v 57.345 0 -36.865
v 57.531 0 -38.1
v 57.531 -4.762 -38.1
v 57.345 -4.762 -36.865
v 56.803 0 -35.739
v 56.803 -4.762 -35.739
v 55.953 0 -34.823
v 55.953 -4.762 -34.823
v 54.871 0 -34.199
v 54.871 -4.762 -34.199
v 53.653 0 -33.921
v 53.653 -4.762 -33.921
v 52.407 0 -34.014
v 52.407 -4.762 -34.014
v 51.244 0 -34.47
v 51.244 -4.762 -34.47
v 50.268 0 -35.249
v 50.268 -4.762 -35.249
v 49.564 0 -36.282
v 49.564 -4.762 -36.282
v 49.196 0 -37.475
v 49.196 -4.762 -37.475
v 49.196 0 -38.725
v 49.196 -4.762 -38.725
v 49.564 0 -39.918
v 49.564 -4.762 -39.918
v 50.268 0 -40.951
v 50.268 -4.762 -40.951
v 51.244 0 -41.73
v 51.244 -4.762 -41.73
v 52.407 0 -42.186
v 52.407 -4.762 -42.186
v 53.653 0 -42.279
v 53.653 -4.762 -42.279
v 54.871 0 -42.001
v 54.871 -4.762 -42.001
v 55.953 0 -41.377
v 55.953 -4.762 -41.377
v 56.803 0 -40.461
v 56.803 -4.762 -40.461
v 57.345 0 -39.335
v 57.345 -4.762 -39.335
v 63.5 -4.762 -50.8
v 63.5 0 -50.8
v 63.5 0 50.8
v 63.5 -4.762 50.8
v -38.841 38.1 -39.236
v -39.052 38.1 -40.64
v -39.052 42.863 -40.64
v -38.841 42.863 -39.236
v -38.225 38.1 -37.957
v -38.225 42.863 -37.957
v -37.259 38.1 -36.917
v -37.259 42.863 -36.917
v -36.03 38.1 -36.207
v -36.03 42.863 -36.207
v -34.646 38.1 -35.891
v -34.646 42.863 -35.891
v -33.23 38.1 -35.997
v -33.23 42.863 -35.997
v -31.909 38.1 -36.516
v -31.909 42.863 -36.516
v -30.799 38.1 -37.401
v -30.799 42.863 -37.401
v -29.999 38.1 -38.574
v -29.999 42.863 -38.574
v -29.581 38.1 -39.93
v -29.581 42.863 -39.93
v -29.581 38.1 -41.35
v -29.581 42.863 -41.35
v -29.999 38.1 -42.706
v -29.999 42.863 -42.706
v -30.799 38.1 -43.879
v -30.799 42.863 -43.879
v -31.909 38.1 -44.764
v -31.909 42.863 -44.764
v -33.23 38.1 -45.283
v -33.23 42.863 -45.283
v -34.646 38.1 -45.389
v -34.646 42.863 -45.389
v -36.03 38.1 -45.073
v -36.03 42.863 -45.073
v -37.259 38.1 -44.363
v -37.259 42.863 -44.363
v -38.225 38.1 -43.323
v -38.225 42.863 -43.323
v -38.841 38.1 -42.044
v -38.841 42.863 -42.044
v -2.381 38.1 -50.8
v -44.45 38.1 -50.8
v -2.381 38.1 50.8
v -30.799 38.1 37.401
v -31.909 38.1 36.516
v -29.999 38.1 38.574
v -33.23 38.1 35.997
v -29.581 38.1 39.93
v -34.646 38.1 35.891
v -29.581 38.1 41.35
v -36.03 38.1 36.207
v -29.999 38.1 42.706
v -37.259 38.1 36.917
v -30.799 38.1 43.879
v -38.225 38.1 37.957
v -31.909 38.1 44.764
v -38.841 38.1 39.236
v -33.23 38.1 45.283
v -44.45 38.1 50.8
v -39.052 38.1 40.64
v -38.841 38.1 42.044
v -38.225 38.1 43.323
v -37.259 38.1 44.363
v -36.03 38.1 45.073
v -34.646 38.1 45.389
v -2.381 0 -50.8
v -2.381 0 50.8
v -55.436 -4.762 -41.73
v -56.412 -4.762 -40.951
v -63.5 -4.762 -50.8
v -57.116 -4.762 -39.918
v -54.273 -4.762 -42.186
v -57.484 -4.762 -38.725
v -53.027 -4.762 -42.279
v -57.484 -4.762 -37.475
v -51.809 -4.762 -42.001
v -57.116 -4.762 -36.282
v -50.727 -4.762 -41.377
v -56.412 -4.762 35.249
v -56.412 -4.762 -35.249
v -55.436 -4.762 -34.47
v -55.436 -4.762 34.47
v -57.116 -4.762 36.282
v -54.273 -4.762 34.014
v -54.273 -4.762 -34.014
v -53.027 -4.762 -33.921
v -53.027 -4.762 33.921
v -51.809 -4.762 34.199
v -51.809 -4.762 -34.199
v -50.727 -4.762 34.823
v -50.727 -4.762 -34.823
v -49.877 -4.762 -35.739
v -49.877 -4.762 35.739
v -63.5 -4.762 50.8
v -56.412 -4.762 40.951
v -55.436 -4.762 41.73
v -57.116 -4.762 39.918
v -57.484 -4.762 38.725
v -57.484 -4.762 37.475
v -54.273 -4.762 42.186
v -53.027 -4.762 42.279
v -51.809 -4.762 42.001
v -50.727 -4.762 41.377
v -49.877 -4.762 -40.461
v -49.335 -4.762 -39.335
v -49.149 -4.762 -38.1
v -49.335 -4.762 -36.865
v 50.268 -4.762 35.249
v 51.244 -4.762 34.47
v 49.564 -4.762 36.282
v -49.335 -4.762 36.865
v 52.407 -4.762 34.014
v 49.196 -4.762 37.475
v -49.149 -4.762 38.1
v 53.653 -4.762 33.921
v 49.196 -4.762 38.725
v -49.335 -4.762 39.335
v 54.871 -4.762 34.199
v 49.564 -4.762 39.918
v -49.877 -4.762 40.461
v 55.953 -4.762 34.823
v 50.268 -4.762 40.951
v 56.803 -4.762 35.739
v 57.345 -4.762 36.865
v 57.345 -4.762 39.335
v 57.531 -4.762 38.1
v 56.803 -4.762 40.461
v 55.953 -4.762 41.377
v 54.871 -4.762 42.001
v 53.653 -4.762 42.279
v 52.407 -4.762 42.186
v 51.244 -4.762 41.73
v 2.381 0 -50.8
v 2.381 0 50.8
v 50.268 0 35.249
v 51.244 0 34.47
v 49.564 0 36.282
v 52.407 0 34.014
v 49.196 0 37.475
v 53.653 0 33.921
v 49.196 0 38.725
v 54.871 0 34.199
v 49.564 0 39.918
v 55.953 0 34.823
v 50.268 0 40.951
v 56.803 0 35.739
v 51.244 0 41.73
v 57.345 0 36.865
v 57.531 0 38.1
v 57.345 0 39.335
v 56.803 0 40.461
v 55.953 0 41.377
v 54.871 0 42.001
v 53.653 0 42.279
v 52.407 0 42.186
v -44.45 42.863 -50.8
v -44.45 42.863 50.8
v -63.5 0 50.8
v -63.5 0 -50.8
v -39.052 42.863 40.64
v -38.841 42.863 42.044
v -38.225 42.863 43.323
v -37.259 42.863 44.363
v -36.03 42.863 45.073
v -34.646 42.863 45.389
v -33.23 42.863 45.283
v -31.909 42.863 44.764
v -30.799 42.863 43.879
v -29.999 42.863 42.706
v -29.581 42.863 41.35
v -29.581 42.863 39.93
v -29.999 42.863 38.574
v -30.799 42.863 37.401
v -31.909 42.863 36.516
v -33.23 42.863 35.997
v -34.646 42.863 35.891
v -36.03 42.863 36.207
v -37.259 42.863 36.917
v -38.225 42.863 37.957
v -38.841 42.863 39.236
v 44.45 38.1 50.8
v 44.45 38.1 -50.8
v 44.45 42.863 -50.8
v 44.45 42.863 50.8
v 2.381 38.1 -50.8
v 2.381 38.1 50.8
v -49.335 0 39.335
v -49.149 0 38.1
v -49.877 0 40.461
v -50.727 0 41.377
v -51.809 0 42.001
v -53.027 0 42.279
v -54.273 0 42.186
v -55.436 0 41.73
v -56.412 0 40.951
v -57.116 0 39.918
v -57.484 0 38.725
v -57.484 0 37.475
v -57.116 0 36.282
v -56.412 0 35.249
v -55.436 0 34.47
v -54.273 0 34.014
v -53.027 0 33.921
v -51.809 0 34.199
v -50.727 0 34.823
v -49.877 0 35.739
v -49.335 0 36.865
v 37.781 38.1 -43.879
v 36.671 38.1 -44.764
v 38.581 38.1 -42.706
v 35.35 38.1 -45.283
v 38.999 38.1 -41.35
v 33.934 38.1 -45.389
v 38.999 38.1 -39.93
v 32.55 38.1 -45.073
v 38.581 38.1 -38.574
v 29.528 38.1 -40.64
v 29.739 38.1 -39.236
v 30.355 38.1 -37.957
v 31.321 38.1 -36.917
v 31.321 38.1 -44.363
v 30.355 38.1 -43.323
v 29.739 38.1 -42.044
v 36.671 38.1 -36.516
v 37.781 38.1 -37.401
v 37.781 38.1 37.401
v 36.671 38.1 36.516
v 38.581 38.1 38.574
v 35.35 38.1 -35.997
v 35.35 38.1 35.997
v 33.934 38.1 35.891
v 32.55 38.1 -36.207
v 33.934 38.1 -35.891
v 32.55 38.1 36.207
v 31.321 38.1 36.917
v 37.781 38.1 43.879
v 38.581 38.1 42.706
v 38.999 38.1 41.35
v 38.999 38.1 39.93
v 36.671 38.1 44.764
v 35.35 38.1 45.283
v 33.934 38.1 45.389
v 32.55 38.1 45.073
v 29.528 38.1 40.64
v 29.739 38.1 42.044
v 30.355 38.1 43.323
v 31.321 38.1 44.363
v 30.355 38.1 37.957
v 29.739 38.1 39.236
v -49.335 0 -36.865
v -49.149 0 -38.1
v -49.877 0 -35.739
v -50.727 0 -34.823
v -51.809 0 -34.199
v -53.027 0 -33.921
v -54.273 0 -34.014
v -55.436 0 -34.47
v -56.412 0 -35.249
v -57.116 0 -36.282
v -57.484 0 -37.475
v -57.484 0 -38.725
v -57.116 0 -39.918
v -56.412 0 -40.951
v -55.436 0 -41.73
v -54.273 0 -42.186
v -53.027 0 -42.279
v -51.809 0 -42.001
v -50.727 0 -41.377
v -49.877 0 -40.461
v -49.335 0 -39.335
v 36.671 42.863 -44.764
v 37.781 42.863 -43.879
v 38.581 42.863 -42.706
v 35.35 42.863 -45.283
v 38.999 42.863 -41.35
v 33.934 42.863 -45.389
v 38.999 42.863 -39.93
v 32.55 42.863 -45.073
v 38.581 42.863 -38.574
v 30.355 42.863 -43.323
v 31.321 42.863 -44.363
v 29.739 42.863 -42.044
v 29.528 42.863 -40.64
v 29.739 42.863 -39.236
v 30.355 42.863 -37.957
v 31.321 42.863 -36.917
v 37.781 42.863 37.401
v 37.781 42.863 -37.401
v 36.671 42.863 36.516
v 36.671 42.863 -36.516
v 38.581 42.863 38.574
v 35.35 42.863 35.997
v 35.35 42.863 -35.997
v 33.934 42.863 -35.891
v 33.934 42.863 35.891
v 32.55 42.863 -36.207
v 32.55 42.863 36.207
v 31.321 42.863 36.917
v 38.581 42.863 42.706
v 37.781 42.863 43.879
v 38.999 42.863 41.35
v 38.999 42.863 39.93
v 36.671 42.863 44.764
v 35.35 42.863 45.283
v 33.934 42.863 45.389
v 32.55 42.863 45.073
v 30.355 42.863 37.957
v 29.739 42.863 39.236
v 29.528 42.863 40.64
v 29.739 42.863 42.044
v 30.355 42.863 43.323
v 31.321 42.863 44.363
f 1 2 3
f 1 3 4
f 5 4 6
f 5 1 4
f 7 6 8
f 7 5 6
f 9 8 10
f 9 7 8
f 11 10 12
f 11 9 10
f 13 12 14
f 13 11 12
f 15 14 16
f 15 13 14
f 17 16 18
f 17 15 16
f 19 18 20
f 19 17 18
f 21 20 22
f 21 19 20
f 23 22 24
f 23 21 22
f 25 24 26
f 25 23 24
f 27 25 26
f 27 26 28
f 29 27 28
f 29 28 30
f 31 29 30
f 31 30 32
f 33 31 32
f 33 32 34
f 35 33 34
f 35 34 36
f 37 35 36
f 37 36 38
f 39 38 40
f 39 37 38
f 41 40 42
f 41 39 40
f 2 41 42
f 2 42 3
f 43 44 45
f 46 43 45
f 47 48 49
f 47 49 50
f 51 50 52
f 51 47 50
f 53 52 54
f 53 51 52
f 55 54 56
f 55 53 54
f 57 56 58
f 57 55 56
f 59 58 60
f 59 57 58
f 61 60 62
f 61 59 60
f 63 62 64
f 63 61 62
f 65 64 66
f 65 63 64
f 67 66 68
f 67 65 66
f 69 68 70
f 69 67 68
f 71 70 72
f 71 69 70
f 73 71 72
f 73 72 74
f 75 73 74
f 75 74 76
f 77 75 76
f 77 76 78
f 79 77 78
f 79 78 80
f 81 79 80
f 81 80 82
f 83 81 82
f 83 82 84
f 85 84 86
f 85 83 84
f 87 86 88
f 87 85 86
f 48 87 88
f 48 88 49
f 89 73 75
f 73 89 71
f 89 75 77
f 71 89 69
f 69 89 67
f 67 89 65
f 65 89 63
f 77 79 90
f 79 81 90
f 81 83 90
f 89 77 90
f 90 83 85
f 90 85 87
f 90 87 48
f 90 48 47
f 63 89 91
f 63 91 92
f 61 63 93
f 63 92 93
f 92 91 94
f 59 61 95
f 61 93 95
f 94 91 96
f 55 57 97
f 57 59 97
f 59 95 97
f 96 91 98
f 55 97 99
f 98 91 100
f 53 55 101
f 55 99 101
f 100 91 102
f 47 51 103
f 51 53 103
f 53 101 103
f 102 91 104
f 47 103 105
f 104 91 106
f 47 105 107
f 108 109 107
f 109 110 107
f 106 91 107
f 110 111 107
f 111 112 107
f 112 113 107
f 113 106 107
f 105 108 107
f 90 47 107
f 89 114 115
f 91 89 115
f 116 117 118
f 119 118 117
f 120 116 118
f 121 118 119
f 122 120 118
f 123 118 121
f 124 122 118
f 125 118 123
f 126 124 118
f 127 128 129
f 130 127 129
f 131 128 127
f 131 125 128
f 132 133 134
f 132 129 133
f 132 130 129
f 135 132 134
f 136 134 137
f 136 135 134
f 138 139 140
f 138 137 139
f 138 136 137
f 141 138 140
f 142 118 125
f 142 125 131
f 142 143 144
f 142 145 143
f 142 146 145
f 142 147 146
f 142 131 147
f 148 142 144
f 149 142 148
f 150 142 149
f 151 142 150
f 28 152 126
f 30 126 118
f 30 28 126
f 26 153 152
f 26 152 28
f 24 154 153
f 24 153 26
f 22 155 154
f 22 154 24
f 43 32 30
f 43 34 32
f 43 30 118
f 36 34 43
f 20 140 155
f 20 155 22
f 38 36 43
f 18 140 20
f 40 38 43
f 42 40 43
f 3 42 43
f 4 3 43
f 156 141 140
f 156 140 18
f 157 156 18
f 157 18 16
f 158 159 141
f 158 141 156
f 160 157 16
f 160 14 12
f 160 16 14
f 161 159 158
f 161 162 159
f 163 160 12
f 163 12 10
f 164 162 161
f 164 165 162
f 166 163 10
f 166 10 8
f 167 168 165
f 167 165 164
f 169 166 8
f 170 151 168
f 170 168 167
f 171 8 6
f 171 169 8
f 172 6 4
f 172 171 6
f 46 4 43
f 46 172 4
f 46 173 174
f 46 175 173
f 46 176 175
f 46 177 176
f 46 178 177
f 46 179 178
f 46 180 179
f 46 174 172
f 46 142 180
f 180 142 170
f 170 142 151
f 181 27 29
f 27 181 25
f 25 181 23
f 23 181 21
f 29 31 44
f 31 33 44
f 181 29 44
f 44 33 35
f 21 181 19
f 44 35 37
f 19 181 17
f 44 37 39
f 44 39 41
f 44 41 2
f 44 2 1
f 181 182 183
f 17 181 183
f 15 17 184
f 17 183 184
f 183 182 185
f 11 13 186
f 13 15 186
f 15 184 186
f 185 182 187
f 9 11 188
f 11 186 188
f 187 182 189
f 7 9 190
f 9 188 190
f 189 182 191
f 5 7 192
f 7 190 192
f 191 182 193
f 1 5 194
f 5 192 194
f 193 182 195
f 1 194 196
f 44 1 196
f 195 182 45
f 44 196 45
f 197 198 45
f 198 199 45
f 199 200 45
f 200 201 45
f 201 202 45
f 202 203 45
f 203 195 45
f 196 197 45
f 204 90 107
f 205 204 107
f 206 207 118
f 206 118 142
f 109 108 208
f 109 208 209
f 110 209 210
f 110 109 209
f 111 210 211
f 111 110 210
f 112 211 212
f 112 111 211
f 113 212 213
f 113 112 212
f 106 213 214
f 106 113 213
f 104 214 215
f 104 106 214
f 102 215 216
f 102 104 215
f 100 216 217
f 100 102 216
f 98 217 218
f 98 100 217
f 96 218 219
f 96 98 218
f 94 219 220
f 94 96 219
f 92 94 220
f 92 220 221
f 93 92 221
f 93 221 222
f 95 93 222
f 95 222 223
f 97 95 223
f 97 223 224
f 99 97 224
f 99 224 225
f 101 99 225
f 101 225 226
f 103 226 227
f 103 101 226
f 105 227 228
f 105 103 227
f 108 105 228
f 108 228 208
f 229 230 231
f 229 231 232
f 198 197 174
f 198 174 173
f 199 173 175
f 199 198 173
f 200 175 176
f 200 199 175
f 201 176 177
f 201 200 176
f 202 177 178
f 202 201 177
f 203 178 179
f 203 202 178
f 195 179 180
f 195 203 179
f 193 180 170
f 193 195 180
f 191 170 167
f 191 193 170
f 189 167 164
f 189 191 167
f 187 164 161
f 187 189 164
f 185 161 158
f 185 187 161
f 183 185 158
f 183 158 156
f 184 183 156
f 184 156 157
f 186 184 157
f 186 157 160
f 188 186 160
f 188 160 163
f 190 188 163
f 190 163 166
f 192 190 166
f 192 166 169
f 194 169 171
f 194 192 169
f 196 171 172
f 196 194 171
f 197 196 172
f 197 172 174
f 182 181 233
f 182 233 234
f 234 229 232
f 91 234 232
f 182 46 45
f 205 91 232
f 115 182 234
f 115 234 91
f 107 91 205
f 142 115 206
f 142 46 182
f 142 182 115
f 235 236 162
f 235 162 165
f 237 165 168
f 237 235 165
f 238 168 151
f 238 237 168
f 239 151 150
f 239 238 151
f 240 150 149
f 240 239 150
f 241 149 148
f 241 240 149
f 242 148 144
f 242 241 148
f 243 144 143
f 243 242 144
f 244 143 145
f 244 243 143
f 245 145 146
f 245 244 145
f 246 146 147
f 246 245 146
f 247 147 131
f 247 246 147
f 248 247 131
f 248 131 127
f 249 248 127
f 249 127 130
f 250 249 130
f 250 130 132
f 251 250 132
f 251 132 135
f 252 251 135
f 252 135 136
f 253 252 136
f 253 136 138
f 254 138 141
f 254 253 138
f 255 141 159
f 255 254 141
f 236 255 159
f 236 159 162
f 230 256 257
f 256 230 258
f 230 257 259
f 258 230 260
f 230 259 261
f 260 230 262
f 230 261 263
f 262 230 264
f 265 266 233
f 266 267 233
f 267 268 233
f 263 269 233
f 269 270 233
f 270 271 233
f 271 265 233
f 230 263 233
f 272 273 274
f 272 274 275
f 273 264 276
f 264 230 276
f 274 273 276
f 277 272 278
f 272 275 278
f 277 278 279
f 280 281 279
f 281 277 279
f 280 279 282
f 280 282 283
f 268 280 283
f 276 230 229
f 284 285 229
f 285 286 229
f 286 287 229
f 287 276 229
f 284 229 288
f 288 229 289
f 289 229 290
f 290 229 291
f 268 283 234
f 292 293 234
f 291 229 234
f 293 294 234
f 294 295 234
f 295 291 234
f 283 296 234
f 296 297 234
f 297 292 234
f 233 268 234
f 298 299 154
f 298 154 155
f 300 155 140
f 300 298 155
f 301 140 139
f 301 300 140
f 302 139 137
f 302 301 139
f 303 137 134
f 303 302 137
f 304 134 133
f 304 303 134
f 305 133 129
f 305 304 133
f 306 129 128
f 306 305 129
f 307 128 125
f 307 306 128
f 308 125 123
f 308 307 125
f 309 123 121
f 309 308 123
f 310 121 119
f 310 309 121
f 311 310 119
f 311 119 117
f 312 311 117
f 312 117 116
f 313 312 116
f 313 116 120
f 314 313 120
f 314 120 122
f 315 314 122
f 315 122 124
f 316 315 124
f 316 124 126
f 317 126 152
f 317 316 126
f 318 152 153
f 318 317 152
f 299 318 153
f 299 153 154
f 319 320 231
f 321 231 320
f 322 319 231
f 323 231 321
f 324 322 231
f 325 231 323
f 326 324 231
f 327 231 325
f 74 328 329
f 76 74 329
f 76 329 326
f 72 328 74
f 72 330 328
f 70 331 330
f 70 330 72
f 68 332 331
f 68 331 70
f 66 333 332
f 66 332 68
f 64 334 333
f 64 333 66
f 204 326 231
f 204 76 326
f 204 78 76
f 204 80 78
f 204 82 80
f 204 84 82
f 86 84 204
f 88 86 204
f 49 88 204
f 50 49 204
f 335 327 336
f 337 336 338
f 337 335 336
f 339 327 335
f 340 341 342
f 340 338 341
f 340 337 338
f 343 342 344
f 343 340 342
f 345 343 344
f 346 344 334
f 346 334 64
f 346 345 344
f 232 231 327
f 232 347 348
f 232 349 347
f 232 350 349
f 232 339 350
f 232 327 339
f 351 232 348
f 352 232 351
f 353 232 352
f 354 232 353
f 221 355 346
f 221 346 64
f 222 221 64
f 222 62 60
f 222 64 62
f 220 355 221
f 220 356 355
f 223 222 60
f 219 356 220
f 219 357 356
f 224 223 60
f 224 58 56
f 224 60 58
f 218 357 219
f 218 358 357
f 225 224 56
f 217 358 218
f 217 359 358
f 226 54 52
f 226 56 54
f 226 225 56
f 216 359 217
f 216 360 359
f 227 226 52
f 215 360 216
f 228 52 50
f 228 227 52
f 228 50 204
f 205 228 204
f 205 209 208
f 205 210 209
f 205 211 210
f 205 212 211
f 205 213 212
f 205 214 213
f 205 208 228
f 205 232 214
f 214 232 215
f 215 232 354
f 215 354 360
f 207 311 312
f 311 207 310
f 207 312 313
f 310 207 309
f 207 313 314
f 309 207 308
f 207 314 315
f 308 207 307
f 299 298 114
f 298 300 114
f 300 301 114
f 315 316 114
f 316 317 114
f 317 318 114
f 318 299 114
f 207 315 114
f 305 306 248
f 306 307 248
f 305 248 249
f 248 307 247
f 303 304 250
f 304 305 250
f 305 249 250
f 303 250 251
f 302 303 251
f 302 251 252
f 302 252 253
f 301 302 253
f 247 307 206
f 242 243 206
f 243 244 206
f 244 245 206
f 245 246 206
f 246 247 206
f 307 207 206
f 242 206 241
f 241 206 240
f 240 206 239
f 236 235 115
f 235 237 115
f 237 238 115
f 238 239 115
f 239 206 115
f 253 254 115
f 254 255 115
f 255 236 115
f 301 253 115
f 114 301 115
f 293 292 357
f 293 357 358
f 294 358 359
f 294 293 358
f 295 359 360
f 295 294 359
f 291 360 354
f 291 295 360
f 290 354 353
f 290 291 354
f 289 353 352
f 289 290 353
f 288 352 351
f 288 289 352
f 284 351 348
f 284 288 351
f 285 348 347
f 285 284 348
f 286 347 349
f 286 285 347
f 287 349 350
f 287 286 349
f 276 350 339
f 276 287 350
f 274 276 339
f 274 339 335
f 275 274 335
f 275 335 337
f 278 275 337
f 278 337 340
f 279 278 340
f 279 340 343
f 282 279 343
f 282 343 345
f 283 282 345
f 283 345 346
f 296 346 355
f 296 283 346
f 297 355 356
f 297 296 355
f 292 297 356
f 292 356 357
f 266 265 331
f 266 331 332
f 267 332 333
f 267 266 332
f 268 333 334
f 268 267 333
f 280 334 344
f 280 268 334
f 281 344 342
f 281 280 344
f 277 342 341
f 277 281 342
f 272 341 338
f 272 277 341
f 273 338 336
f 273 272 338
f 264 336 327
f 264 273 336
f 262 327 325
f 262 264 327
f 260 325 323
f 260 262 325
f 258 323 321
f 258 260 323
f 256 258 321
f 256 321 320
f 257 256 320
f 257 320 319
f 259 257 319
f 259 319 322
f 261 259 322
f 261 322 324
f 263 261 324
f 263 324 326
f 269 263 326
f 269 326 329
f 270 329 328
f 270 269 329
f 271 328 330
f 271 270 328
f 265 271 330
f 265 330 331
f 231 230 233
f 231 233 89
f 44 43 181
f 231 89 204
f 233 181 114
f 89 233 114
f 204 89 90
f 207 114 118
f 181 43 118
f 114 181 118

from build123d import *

# Parameters (mm, degrees)
F0_W     = 127
F0_H     = 101.6
F0_R     = 4.191
F1_DEPTH = 4.7625
F2_W     = 4.7625
F2_H     = 101.6
F3_DEPTH = 38.1
F4_W     = 88.9
F4_H     = 101.6
F4_R     = 4.7625
F5_DEPTH = 4.7625


with BuildPart() as f1:
    # F0 (on Front) → F1 (new body)
    with BuildSketch(Plane.XZ):
        Rectangle(F0_W, F0_H)
        with Locations((-53.34, -38.1)):
            Circle(F0_R, mode=Mode.SUBTRACT)
        with Locations((53.34, -38.1)):
            Circle(F0_R, mode=Mode.SUBTRACT)
        with Locations((-53.34, 38.1)):
            Circle(F0_R, mode=Mode.SUBTRACT)
        with Locations((53.34, 38.1)):
            Circle(F0_R, mode=Mode.SUBTRACT)
    extrude(amount=F1_DEPTH)

    # F2 (on face) → F3 (join)
    with BuildSketch(Plane(origin=(0, 0, 0), x_dir=(-1, 0, 0), z_dir=(0, 1, 0))):
        Rectangle(F2_W, F2_H)
    extrude(amount=F3_DEPTH)

    # F4 (on face) → F5 (join)
    with BuildSketch(Plane(origin=(0, 38.1, 0), x_dir=(-1, 0, 0), z_dir=(0, 1, 0))):
        Rectangle(F4_W, F4_H)
        with Locations((-34.29, -40.64)):
            Circle(F4_R, mode=Mode.SUBTRACT)
        with Locations((34.29, -40.64)):
            Circle(F4_R, mode=Mode.SUBTRACT)
        with Locations((-34.29, 40.64)):
            Circle(F4_R, mode=Mode.SUBTRACT)
        with Locations((34.29, 40.64)):
            Circle(F4_R, mode=Mode.SUBTRACT)
    extrude(amount=F5_DEPTH)


solid = f1.part
